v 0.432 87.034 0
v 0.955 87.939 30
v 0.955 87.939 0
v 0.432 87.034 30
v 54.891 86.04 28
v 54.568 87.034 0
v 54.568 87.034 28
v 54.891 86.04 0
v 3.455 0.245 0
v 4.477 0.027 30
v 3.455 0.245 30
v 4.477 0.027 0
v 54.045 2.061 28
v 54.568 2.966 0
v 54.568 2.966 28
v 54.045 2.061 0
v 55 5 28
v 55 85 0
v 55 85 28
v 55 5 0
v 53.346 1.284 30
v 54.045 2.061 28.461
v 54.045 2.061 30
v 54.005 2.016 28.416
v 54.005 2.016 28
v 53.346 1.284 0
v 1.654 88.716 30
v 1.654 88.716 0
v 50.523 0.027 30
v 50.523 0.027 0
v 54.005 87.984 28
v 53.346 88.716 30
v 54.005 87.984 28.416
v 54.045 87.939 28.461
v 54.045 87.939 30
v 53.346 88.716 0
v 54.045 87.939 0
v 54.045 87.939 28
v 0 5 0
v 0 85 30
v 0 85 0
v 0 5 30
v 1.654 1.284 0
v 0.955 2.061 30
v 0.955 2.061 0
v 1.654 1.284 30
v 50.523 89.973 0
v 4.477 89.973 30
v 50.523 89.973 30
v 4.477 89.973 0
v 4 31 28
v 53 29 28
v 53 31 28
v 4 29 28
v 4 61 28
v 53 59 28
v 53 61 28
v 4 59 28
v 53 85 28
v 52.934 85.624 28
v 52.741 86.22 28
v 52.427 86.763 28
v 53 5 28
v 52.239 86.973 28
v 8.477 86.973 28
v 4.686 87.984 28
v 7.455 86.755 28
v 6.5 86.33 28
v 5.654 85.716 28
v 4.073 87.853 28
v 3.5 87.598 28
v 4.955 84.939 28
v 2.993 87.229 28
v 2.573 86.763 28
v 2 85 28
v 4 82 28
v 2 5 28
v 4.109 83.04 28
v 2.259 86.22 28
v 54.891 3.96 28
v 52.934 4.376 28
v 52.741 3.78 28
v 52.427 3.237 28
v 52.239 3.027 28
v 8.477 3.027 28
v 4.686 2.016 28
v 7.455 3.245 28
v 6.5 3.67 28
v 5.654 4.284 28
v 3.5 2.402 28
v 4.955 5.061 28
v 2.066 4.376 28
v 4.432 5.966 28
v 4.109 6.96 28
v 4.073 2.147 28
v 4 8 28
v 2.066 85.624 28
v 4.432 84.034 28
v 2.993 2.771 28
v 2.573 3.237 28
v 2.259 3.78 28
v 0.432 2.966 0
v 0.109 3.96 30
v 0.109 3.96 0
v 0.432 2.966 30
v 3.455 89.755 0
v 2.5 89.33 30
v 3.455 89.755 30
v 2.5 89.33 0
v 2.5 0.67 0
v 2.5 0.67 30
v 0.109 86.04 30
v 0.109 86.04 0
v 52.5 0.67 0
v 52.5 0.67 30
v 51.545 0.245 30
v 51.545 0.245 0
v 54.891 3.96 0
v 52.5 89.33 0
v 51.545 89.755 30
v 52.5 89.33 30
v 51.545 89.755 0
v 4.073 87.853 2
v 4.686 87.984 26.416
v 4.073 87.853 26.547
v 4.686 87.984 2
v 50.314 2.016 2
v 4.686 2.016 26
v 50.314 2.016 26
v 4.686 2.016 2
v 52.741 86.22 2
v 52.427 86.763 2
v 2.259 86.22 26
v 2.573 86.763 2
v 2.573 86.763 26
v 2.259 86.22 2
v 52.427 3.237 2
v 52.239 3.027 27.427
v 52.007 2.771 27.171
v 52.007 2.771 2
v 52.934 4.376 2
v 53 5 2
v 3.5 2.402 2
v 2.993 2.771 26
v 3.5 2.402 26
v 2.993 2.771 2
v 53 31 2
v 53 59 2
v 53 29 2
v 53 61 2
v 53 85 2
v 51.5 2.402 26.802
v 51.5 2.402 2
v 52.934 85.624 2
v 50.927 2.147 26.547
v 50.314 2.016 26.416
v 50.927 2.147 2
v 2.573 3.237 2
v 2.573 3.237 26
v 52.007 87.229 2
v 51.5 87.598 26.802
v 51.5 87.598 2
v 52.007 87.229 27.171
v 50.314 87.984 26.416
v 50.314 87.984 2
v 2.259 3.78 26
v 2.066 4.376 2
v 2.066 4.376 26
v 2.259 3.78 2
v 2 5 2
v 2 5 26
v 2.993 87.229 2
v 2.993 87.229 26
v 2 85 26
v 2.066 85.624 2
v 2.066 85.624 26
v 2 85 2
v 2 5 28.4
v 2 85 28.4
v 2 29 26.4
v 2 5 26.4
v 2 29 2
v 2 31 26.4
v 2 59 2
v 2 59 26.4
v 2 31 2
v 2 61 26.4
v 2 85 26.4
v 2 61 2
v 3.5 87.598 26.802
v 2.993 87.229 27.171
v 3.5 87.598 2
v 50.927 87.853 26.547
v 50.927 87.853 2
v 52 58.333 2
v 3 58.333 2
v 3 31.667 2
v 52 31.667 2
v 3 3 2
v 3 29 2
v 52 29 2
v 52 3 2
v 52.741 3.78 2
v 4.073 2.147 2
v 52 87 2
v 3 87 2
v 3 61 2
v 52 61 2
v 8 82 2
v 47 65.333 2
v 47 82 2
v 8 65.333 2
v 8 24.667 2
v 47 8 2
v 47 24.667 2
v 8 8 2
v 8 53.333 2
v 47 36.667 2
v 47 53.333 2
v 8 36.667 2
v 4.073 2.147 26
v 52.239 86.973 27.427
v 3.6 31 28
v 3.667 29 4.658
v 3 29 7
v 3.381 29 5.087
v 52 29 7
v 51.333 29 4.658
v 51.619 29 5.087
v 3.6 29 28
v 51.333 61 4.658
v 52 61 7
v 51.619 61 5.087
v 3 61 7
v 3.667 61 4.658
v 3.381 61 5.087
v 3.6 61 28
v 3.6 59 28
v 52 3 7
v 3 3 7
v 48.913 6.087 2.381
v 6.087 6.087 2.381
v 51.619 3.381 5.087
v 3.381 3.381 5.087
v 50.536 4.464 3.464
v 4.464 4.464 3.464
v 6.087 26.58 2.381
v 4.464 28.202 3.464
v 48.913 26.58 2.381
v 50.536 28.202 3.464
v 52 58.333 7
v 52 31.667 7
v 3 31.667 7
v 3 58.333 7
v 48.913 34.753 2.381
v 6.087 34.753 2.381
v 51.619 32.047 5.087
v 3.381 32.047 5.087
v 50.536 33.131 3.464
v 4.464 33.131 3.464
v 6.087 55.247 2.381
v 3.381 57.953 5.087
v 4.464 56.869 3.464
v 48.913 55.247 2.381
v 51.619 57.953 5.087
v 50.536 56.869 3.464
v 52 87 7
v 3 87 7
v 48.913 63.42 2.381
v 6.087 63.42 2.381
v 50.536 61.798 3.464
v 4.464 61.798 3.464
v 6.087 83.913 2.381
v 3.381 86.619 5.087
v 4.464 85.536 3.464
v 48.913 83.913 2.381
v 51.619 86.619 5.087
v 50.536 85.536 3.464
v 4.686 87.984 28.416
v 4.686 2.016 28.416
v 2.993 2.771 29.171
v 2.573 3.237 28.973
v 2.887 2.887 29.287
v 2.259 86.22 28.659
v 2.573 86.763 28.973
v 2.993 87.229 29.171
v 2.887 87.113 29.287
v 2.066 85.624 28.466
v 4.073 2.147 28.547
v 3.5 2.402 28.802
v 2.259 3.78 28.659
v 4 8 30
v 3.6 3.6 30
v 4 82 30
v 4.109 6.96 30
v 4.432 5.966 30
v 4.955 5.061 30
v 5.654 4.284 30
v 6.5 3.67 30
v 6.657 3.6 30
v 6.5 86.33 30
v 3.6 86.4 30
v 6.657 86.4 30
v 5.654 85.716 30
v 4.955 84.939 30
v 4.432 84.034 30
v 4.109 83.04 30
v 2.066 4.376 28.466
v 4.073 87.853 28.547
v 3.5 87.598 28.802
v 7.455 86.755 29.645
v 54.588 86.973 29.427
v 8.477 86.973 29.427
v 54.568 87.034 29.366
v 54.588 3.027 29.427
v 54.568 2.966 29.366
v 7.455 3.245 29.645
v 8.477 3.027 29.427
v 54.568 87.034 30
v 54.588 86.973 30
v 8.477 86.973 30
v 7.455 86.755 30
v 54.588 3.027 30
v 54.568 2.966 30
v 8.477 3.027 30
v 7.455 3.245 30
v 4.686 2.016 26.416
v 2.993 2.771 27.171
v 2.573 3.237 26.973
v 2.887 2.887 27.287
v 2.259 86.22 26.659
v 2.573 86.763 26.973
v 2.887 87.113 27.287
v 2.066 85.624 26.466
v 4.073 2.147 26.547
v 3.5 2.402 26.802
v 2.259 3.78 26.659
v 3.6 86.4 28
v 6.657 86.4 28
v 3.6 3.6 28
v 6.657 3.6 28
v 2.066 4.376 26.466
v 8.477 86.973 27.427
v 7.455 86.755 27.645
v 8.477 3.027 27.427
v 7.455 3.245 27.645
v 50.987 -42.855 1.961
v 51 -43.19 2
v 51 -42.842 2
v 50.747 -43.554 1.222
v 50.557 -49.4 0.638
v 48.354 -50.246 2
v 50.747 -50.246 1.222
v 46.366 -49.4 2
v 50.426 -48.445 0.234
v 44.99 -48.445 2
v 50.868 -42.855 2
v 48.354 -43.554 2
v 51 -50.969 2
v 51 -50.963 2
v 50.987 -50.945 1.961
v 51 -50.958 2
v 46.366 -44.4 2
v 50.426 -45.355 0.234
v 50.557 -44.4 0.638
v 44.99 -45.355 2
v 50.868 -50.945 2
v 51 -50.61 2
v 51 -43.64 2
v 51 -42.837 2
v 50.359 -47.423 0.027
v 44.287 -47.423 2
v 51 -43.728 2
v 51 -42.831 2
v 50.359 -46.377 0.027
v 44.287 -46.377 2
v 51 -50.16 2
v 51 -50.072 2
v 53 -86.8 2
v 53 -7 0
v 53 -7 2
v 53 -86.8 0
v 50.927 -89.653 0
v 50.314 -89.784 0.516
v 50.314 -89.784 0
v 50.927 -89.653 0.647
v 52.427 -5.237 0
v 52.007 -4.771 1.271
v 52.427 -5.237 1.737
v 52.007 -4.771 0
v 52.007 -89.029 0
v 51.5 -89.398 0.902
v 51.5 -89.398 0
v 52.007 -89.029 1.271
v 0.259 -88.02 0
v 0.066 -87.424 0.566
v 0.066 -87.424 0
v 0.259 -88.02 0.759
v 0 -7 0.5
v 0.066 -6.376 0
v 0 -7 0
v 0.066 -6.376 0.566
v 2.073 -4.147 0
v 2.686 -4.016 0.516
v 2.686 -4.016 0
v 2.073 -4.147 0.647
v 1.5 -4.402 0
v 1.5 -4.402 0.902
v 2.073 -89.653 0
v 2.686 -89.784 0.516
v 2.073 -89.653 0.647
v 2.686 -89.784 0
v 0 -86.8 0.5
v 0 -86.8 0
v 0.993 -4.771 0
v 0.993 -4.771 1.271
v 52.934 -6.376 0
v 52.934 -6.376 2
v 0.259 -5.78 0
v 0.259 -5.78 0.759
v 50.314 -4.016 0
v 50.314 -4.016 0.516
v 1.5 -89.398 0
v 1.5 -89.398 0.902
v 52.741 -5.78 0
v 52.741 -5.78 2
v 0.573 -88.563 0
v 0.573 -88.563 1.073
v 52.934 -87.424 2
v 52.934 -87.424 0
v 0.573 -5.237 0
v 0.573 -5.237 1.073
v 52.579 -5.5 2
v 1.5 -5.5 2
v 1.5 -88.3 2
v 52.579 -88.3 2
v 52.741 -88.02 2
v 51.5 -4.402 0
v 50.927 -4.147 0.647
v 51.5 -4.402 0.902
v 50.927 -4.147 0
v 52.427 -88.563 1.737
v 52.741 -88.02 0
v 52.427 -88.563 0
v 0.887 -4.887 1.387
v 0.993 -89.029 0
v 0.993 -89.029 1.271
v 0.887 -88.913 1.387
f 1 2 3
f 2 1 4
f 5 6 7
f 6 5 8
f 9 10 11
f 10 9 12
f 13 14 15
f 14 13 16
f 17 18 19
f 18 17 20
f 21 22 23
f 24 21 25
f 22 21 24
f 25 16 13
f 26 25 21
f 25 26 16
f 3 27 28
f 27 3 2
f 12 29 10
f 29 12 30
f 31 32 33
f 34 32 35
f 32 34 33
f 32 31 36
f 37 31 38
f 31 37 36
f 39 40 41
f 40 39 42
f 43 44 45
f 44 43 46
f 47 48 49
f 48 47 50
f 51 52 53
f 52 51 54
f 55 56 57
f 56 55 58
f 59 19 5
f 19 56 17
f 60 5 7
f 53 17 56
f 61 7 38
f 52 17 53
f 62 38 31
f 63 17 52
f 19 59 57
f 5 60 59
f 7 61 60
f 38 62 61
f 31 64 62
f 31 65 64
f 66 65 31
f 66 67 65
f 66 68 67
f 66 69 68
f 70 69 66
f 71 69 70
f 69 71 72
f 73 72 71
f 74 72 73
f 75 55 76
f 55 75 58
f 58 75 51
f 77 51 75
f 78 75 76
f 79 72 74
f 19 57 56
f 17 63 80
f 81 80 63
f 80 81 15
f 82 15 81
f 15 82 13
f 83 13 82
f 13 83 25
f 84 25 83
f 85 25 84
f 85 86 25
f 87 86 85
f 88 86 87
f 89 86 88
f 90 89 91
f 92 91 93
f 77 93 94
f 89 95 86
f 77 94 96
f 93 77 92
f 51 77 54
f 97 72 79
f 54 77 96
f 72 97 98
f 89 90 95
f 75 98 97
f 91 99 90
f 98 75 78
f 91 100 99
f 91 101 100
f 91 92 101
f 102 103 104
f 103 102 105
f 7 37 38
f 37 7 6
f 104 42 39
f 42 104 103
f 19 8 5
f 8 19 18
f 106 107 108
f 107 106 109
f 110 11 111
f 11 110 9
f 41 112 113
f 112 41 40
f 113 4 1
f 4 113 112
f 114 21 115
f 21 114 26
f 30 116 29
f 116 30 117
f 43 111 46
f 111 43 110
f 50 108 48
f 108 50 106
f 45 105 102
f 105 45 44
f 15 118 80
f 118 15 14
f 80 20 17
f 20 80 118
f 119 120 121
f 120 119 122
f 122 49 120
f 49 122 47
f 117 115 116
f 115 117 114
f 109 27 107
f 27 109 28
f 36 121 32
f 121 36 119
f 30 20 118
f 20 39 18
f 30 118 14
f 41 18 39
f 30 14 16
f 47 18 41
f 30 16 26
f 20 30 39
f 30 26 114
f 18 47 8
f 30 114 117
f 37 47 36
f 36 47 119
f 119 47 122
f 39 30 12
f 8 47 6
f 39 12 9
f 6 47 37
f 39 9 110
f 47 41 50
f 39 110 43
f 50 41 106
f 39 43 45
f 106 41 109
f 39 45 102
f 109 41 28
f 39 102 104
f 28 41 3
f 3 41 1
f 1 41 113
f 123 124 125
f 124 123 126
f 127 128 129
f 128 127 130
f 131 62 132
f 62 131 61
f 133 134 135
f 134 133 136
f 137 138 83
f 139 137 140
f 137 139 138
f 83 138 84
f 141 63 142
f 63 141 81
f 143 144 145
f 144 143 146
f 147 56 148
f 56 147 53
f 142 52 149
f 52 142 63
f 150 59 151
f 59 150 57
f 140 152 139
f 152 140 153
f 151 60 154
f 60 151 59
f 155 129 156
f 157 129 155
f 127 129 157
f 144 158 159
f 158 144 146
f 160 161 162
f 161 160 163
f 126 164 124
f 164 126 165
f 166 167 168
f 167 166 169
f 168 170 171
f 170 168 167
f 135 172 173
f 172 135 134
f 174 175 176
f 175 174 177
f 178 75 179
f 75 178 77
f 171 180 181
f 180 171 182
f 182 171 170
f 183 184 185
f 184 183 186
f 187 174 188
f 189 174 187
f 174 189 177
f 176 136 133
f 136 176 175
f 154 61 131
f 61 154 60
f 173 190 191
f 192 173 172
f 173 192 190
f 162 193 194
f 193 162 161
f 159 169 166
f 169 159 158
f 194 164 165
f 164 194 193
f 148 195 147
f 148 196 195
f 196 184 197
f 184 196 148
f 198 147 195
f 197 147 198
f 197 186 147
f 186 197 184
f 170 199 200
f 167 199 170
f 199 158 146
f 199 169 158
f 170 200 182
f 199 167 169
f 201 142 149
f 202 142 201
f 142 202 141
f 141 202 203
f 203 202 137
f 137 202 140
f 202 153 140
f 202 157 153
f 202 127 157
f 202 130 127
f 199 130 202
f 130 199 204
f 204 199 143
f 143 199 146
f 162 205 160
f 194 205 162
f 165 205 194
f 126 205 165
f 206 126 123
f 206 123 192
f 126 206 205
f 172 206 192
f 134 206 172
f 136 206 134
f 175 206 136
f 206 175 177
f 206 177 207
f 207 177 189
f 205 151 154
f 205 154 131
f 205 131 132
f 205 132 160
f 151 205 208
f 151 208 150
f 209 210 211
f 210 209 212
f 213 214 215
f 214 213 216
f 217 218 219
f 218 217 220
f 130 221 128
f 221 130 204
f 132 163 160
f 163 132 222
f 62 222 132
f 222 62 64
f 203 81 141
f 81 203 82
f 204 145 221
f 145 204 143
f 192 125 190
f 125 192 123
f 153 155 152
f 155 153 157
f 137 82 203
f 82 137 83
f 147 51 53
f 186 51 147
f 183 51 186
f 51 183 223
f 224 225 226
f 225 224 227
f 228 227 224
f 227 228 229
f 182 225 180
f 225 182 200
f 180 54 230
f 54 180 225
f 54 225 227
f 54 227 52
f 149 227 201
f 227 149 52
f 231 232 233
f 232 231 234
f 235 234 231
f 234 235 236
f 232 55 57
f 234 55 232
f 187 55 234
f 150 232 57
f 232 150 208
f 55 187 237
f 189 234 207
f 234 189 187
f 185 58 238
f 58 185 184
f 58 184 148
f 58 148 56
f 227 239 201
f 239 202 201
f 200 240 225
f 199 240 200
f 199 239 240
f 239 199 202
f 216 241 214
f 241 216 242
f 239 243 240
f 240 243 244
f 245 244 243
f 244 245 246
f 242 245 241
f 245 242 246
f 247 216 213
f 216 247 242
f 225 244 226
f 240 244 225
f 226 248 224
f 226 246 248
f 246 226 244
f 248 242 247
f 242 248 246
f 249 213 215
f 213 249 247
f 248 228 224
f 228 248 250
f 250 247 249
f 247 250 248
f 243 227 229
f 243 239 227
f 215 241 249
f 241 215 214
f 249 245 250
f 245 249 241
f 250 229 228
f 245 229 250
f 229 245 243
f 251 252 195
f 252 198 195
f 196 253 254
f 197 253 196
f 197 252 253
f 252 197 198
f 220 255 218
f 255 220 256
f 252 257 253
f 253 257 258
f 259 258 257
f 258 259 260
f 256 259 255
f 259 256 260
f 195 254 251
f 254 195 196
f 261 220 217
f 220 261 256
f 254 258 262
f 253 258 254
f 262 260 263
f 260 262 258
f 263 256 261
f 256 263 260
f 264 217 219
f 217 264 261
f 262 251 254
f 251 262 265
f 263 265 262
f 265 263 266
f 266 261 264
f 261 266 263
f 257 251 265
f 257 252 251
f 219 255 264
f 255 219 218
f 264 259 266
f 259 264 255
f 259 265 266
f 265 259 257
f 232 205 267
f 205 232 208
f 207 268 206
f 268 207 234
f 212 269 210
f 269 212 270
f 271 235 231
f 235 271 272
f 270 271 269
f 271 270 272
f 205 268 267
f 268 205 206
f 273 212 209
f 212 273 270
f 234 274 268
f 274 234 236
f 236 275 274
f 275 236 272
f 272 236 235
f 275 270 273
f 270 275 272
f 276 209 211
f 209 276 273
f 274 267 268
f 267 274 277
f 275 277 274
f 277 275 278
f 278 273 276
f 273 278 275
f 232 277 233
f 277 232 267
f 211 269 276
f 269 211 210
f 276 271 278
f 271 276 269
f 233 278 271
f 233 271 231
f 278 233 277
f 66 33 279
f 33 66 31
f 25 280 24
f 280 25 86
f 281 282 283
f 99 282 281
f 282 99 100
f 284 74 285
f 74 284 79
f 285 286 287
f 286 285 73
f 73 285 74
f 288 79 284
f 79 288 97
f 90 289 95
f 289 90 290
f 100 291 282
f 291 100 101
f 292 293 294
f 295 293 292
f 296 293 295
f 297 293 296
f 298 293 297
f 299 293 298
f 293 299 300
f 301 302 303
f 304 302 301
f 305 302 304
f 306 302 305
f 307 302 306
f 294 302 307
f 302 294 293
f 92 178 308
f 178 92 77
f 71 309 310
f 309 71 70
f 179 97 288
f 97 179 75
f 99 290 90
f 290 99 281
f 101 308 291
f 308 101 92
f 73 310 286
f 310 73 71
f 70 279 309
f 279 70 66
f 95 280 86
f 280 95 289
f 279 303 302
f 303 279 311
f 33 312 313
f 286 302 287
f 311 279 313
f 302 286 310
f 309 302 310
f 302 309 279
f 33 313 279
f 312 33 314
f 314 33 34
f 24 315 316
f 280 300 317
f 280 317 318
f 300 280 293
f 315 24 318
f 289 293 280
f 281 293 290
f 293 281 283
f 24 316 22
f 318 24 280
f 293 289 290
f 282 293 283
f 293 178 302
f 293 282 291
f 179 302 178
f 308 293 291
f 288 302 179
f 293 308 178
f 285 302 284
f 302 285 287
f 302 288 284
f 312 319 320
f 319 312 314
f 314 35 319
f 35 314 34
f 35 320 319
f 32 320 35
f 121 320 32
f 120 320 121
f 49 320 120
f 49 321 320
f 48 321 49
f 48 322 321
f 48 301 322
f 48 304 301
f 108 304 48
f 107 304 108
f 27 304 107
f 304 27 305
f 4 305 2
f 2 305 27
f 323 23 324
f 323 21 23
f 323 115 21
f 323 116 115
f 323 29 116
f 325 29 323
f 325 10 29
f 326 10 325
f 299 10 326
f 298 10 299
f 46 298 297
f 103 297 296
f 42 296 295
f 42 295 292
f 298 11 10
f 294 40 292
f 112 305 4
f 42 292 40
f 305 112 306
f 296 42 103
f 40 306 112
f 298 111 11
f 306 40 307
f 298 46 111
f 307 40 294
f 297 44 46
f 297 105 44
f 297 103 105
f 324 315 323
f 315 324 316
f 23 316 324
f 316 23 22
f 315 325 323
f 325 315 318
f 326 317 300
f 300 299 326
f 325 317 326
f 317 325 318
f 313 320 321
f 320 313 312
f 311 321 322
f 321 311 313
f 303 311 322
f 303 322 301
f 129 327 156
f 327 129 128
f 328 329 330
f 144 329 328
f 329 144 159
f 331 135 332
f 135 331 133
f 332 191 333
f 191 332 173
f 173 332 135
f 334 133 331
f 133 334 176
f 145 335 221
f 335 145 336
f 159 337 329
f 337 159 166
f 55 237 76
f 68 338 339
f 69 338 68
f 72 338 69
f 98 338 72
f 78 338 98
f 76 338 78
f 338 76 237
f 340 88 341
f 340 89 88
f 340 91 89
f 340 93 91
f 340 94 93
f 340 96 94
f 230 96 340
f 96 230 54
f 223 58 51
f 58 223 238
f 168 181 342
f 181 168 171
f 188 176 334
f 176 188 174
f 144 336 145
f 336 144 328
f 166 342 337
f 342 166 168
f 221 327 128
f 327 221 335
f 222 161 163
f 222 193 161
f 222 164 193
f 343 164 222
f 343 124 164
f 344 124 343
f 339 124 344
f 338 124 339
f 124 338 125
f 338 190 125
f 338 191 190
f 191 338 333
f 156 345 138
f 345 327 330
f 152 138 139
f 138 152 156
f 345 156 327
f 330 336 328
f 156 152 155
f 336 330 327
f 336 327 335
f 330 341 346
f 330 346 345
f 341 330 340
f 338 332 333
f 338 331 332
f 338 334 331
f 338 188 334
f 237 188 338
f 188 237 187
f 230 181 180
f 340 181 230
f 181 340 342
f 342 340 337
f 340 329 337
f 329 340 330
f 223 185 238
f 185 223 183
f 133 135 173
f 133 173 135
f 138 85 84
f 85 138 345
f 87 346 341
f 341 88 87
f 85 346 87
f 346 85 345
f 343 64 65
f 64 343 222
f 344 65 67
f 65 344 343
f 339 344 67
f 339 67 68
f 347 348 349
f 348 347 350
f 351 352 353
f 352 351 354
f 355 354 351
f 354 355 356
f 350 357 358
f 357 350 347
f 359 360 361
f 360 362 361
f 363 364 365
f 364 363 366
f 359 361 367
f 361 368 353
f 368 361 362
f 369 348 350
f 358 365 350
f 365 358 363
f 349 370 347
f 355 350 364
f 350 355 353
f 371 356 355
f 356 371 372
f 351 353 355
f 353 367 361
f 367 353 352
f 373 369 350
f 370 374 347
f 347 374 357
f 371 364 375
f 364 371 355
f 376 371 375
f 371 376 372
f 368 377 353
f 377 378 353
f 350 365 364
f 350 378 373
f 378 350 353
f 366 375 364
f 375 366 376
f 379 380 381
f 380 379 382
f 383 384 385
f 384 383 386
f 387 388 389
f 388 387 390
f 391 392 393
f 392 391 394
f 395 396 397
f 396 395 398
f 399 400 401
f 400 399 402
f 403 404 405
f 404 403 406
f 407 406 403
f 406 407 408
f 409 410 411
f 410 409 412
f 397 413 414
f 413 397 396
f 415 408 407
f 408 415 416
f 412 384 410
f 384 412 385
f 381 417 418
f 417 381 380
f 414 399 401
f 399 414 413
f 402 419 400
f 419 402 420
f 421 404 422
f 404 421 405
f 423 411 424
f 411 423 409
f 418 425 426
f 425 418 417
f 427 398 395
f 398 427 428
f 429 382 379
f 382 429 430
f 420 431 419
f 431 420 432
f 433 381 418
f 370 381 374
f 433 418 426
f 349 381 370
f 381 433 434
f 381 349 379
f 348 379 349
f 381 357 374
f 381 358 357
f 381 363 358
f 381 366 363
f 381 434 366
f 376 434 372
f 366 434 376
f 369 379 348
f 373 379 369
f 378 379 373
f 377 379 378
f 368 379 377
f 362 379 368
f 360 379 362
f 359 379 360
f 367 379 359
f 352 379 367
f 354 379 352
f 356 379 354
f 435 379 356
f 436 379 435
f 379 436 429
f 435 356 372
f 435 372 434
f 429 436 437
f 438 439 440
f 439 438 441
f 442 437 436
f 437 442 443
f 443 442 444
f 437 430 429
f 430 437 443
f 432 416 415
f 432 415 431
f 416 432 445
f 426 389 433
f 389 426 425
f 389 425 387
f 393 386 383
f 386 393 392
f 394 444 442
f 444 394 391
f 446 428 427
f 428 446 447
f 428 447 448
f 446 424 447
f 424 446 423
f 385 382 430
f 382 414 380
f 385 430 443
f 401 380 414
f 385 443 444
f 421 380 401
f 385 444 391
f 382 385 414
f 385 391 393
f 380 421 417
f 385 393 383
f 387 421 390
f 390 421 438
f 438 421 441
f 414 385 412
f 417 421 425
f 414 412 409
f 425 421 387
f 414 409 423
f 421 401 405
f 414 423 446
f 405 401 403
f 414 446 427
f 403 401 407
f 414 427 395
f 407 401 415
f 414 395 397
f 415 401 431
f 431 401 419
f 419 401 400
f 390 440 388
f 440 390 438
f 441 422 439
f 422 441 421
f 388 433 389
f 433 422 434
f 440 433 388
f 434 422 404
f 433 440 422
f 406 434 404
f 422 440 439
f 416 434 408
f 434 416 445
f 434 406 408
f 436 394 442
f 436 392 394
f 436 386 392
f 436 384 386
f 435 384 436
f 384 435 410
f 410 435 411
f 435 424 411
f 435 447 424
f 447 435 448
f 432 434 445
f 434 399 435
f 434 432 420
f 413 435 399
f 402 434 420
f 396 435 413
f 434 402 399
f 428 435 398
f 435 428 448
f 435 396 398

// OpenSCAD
itemsShown="both"; // [both,box,lid]
boxLength=55;
boxWidth=90;
boxHeight=30;
cornerRadius=5;
wallThickness=2;
bottomThickness=2;
lidThickness=2;
lidClearance=0.2;
lidEdgeThickness=0.5;
columns = 3; //[1:10]
rows = 1; //[1:10]
// Notch in the lid
withNotch=true;//[true:false]
bevelRadius = 5;//[0:.25:10]

/* [Global] */
if (itemsShown=="box") showBox();
if (itemsShown=="lid") showLid();
if (itemsShown=="both"){showBox();showLid();}


module showLid(){
	translate ([0, -2*wallThickness, 0]) 
	roundBoxLid(l=boxLength-wallThickness,
				w=boxWidth-2*wallThickness-lidClearance,
				h=lidThickness,
				et=lidEdgeThickness,
				r=cornerRadius-wallThickness,
				notch=withNotch);
}

module showBox(){
	round_box(l=boxLength,
			  w=boxWidth,
			  h=boxHeight,
			  bt=bottomThickness,
			  wt=wallThickness,
			  lt=lidThickness,
			  r=cornerRadius,
              rs=rows,
              cs=columns);
}

module round_box(l=40,w=30,h=30,bt=2,wt=2,lt=2,r=5,rs=1,cs=1){
	difference() { 
		round_cube(l=l,w=w,h=h-lt,r=r);
		translate ([wt, wt, bt]) 
		round_cube(l=l-wt*2,w=w-wt*2,h=h,r=r-wt);
	}
    
    // add cells
    for (i = [2:1:rs]) {
        translate([(l/rs)*(i-1)-(wt/2),wt,wt])
        cube([wt, w - wt*2, h-wt*2]);
    }
    for (i = [2:1:cs]) {
        translate([wt, (w/cs)*(i-1)-(wt/2), wt])
        cube([l - wt*2, wt, h-wt*2]);
    }
    
    // add inner bevels
    for (row = [0:rs-1], column = [0:cs-1]) {
		echo("Row", row, "Column", column);
		ht = wt / 2;
		roundBoxBevel(
			x1=wt + row * ((l-2*wt) / rs) + ht,
			y1=wt + column * ((w-2*wt) / cs) + ht,
			x2=wt + (row +1) * ((l-2*wt) / rs) - ht,
			y2=wt + (column+1) * ((w-2*wt) / cs) - ht,
			radius=bevelRadius,
			wt=wt
		);
    }
    
	//use two box rims. one to make a slope to support the lid
	roundBoxRim();
	translate ([0, 0, -wt]) roundBoxRim();
}


module roundBoxRim(l=boxLength,
				   w=boxWidth,
				   h=boxHeight,
				   et=lidEdgeThickness,
				   r=cornerRadius,
				   wt=wallThickness,
				   lt=lidThickness){
	difference() { 
		translate ([0, 0, h-lt]) 
		round_cube(l=l,w=w,h=lt,r=r);
		translate ([wt+lt,wt+lt-et*2,h-lt-0.1]) 
		round_cube(l=l*2,w=w-2*(wt+lt)+4*et,h=lt+0.2,r=r-wt+lt);

		//subtract out a lid to make the ledge
		translate ([wt, w-wt, h-lt-0.1])
		roundBoxLid(l=l*2,w=w-2*wt,h=lt+0.1,wt=wt,t=lt,et=0.5,r=r-wt,notch=false);
	}
}

module roundBoxLid(l=40,w=30,h=3,wt=2,t=2,et=0.5,r=5,notch=true){
	translate ([l, 0, 0]) 
	rotate (a = [0, 0, 180]) 
	difference(){
		round_cube(l=l,w=w,h=h,t=t,r=r);

		translate ([-1, 0, et]) rotate (a = [45, 0, 0])  cube (size = [l+2, h*2, h*2]); 
		translate ([-1, w, et]) rotate (a = [45, 0, 0])  cube (size = [l+2, h*2, h*2]); 
		translate ([l, -1, et]) rotate (a = [45, 0, 90]) cube (size = [w+2, h*2, h*2]); 
		if (notch==true){
			translate([2,w/2,h+0.001]) thumbNotch(10/2,72,t);
		}
	}
}

module thumbNotch(
	thumbR=12/2,
	angle=72,
	notchHeight=2){

	size=10*thumbR;

	rotate([0,0,90])
	difference(){
		translate([0,
					(thumbR*sin(angle)-notchHeight)/tan(angle),
					 thumbR*sin(angle)-notchHeight])
		rotate([angle,0,0])
		cylinder(r=thumbR,h=size,$fn=30);

		translate([-size,-size,0])
		cube(size*2);
	}
}

module round_cube(l=40,w=30,h=20,r=5,$fn=30){
	hull(){ 
		translate ([r, r, 0]) cylinder (h = h, r=r);
		translate ([r, w-r, 0]) cylinder (h = h, r=r);
		translate ([l-r,w-r, 0]) cylinder (h = h, r=r);
		translate ([l-r, r, 0]) cylinder (h = h, r=r);
	}
}

module roundBoxBevel(x1,y1,x2,y2,radius,wt) {
%    color("red", .25) translate([x1, y1, 0]) cube([x2-x1, y2-y1, 50]);
    if (radius > 0) {
        translate([x1, y1, wt]) rotate([0, 0, 90]) rotate([90, 0, 0]) bevel(x2-x1, radius);
        translate([x1, y2, wt]) rotate([90, 0, 0]) rotate([0, 0, 0]) bevel(y2-y1, radius);
        translate([x2, y2, wt]) rotate([0, 0, 270]) rotate([90, 0, 0]) bevel(x2-x1, radius);
        translate([x2, y2, wt]) rotate([0, 0, 90]) rotate([0, 270, 0]) bevel(y2-y1, radius);
    }
}

module bevel(length,radius) {
    difference() {
        cube([radius, radius, length]);
        translate([radius, radius, -1])
        cylinder(length + 2, radius, radius, false);
    }
}
    
